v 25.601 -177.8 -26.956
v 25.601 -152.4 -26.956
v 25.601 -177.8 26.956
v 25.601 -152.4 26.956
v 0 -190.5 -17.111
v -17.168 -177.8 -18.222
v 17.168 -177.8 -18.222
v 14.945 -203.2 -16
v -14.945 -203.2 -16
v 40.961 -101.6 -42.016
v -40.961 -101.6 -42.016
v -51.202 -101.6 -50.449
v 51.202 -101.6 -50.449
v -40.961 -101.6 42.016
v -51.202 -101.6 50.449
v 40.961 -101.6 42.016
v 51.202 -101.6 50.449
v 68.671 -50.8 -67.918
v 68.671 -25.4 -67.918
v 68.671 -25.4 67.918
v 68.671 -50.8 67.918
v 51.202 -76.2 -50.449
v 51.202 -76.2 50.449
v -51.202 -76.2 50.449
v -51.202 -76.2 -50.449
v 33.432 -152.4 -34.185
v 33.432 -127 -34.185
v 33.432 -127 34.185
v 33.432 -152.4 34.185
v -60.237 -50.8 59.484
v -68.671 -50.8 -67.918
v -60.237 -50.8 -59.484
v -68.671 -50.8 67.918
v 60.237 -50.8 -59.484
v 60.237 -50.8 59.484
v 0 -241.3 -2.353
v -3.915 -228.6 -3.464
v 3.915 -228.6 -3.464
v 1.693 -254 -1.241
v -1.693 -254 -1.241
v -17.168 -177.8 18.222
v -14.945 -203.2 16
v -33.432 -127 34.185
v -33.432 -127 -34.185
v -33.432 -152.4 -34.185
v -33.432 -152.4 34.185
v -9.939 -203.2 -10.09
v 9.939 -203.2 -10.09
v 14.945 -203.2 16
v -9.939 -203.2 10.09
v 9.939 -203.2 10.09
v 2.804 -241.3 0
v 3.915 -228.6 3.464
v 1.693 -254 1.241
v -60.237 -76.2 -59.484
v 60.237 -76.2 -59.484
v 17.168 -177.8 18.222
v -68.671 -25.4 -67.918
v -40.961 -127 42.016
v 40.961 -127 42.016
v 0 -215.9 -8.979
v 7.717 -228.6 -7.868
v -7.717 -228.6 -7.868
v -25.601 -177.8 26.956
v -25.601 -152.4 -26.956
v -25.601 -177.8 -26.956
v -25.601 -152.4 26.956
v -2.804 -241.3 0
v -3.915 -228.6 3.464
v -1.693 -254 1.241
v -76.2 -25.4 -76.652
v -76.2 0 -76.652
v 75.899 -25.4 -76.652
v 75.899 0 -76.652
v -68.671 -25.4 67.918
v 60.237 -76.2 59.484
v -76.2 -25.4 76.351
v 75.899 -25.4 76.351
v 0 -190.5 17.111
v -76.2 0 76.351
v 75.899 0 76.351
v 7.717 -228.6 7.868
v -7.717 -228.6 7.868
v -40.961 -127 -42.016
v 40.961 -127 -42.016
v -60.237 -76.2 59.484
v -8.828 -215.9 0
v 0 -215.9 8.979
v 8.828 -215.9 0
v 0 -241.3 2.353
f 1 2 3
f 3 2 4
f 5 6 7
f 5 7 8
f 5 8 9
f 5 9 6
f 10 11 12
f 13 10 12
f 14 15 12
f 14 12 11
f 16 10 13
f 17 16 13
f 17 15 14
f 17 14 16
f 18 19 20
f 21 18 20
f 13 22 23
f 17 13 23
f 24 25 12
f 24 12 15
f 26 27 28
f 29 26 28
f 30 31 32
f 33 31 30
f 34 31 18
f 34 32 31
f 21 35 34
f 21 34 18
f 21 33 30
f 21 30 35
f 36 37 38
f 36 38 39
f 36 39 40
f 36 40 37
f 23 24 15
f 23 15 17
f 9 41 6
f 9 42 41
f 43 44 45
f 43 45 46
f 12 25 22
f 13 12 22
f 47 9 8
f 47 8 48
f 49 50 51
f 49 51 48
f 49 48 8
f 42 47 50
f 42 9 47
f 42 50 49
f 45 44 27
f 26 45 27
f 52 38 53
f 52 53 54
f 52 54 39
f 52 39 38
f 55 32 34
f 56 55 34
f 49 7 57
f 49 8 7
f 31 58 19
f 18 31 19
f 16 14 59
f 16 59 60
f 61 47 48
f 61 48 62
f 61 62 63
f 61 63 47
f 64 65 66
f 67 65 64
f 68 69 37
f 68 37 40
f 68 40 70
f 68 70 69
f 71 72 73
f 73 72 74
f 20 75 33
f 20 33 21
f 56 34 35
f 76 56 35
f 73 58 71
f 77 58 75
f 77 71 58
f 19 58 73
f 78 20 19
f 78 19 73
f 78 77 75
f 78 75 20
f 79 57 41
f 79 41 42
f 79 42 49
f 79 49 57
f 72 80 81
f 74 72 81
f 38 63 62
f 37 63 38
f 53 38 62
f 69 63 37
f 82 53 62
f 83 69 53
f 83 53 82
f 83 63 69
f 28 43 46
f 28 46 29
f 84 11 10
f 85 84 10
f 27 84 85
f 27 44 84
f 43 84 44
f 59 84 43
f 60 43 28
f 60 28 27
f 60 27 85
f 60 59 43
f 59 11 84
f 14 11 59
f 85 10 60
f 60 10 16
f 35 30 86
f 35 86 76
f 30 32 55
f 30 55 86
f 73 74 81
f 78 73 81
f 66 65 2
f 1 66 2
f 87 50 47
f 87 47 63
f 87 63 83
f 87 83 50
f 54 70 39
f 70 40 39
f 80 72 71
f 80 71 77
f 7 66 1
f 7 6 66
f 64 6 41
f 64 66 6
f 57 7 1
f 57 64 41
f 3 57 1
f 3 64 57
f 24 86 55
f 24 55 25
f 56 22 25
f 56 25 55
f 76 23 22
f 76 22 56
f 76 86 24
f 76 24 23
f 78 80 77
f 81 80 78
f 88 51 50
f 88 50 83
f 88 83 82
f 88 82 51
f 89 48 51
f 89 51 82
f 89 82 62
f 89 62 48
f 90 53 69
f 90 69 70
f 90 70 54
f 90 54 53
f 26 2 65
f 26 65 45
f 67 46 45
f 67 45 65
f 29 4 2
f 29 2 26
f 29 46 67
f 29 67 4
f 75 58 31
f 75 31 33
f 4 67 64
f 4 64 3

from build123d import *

# Parameters (mm, degrees)
F0_W      = 152.0995497704
F0_H      = 153.0030965805
F1_DEPTH  = 25.4
F2_W      = 137.3413652182
F2_H      = 135.8354389668
F3_DEPTH  = 25.4
F4_W      = 120.4748898745
F4_H      = 118.9689487219
F5_DEPTH  = 25.4
F6_W      = 102.4036556482
F6_H      = 100.8977144957
F7_DEPTH  = 25.4
F8_W      = 81.9229260087
F8_H      = 84.0312317014
F9_DEPTH  = 25.4
F10_W     = 66.863566637
F10_H     = 68.3694928885
F11_DEPTH = 25.4
F12_W     = 51.2018278241
F12_H     = 53.9125055075
F13_DEPTH = 25.4
F14_W     = 34.3353450298
F14_H     = 36.4436469972
F15_DEPTH = 25.4
F15_TAPER = 5
F16_W     = 19.8783595115
F16_H     = 20.1795380563
F17_DEPTH = 25.4
F17_TAPER = 5
F18_W     = 7.8308703378
F18_H     = 6.9273011759
F19_DEPTH = 25.4
F19_TAPER = 5


with BuildPart() as f1:
    # F0 (on Front) → F1 (new body)
    with BuildSketch(Plane.XZ):
        with Locations((-0.150591135, -0.150591135)):
            Rectangle(F0_W, F0_H)
    extrude(amount=F1_DEPTH)

    # F2 (on face) → F3 (join)
    with BuildSketch(Plane.XZ.offset(25.4)):
        Rectangle(F2_W, F2_H)
    extrude(amount=F3_DEPTH)

    # F4 (on face) → F5 (join)
    with BuildSketch(Plane.XZ.offset(50.8)):
        Rectangle(F4_W, F4_H)
    extrude(amount=F5_DEPTH)

    # F6 (on face) → F7 (join)
    with BuildSketch(Plane.XZ.offset(76.2)):
        Rectangle(F6_W, F6_H)
    extrude(amount=F7_DEPTH)

    # F8 (on face) → F9 (join)
    with BuildSketch(Plane.XZ.offset(101.6)):
        Rectangle(F8_W, F8_H)
    extrude(amount=F9_DEPTH)

    # F10 (on face) → F11 (join)
    with BuildSketch(Plane.XZ.offset(127)):
        Rectangle(F10_W, F10_H)
    extrude(amount=F11_DEPTH)

    # F12 (on face) → F13 (join)
    with BuildSketch(Plane.XZ.offset(152.4)):
        Rectangle(F12_W, F12_H)
    extrude(amount=F13_DEPTH)

    # F14 (on face) → F15 (join)
    with BuildSketch(Plane.XZ.offset(177.8)):
        Rectangle(F14_W, F14_H)
    extrude(amount=F15_DEPTH, taper=F15_TAPER)

    # F16 (on face) → F17 (join)
    with BuildSketch(Plane.XZ.offset(203.2)):
        Rectangle(F16_W, F16_H)
    extrude(amount=F17_DEPTH, taper=F17_TAPER)

    # F18 (on face) → F19 (join)
    with BuildSketch(Plane.XZ.offset(228.6)):
        Rectangle(F18_W, F18_H)
    extrude(amount=F19_DEPTH, taper=F19_TAPER)


solid = f1.part
